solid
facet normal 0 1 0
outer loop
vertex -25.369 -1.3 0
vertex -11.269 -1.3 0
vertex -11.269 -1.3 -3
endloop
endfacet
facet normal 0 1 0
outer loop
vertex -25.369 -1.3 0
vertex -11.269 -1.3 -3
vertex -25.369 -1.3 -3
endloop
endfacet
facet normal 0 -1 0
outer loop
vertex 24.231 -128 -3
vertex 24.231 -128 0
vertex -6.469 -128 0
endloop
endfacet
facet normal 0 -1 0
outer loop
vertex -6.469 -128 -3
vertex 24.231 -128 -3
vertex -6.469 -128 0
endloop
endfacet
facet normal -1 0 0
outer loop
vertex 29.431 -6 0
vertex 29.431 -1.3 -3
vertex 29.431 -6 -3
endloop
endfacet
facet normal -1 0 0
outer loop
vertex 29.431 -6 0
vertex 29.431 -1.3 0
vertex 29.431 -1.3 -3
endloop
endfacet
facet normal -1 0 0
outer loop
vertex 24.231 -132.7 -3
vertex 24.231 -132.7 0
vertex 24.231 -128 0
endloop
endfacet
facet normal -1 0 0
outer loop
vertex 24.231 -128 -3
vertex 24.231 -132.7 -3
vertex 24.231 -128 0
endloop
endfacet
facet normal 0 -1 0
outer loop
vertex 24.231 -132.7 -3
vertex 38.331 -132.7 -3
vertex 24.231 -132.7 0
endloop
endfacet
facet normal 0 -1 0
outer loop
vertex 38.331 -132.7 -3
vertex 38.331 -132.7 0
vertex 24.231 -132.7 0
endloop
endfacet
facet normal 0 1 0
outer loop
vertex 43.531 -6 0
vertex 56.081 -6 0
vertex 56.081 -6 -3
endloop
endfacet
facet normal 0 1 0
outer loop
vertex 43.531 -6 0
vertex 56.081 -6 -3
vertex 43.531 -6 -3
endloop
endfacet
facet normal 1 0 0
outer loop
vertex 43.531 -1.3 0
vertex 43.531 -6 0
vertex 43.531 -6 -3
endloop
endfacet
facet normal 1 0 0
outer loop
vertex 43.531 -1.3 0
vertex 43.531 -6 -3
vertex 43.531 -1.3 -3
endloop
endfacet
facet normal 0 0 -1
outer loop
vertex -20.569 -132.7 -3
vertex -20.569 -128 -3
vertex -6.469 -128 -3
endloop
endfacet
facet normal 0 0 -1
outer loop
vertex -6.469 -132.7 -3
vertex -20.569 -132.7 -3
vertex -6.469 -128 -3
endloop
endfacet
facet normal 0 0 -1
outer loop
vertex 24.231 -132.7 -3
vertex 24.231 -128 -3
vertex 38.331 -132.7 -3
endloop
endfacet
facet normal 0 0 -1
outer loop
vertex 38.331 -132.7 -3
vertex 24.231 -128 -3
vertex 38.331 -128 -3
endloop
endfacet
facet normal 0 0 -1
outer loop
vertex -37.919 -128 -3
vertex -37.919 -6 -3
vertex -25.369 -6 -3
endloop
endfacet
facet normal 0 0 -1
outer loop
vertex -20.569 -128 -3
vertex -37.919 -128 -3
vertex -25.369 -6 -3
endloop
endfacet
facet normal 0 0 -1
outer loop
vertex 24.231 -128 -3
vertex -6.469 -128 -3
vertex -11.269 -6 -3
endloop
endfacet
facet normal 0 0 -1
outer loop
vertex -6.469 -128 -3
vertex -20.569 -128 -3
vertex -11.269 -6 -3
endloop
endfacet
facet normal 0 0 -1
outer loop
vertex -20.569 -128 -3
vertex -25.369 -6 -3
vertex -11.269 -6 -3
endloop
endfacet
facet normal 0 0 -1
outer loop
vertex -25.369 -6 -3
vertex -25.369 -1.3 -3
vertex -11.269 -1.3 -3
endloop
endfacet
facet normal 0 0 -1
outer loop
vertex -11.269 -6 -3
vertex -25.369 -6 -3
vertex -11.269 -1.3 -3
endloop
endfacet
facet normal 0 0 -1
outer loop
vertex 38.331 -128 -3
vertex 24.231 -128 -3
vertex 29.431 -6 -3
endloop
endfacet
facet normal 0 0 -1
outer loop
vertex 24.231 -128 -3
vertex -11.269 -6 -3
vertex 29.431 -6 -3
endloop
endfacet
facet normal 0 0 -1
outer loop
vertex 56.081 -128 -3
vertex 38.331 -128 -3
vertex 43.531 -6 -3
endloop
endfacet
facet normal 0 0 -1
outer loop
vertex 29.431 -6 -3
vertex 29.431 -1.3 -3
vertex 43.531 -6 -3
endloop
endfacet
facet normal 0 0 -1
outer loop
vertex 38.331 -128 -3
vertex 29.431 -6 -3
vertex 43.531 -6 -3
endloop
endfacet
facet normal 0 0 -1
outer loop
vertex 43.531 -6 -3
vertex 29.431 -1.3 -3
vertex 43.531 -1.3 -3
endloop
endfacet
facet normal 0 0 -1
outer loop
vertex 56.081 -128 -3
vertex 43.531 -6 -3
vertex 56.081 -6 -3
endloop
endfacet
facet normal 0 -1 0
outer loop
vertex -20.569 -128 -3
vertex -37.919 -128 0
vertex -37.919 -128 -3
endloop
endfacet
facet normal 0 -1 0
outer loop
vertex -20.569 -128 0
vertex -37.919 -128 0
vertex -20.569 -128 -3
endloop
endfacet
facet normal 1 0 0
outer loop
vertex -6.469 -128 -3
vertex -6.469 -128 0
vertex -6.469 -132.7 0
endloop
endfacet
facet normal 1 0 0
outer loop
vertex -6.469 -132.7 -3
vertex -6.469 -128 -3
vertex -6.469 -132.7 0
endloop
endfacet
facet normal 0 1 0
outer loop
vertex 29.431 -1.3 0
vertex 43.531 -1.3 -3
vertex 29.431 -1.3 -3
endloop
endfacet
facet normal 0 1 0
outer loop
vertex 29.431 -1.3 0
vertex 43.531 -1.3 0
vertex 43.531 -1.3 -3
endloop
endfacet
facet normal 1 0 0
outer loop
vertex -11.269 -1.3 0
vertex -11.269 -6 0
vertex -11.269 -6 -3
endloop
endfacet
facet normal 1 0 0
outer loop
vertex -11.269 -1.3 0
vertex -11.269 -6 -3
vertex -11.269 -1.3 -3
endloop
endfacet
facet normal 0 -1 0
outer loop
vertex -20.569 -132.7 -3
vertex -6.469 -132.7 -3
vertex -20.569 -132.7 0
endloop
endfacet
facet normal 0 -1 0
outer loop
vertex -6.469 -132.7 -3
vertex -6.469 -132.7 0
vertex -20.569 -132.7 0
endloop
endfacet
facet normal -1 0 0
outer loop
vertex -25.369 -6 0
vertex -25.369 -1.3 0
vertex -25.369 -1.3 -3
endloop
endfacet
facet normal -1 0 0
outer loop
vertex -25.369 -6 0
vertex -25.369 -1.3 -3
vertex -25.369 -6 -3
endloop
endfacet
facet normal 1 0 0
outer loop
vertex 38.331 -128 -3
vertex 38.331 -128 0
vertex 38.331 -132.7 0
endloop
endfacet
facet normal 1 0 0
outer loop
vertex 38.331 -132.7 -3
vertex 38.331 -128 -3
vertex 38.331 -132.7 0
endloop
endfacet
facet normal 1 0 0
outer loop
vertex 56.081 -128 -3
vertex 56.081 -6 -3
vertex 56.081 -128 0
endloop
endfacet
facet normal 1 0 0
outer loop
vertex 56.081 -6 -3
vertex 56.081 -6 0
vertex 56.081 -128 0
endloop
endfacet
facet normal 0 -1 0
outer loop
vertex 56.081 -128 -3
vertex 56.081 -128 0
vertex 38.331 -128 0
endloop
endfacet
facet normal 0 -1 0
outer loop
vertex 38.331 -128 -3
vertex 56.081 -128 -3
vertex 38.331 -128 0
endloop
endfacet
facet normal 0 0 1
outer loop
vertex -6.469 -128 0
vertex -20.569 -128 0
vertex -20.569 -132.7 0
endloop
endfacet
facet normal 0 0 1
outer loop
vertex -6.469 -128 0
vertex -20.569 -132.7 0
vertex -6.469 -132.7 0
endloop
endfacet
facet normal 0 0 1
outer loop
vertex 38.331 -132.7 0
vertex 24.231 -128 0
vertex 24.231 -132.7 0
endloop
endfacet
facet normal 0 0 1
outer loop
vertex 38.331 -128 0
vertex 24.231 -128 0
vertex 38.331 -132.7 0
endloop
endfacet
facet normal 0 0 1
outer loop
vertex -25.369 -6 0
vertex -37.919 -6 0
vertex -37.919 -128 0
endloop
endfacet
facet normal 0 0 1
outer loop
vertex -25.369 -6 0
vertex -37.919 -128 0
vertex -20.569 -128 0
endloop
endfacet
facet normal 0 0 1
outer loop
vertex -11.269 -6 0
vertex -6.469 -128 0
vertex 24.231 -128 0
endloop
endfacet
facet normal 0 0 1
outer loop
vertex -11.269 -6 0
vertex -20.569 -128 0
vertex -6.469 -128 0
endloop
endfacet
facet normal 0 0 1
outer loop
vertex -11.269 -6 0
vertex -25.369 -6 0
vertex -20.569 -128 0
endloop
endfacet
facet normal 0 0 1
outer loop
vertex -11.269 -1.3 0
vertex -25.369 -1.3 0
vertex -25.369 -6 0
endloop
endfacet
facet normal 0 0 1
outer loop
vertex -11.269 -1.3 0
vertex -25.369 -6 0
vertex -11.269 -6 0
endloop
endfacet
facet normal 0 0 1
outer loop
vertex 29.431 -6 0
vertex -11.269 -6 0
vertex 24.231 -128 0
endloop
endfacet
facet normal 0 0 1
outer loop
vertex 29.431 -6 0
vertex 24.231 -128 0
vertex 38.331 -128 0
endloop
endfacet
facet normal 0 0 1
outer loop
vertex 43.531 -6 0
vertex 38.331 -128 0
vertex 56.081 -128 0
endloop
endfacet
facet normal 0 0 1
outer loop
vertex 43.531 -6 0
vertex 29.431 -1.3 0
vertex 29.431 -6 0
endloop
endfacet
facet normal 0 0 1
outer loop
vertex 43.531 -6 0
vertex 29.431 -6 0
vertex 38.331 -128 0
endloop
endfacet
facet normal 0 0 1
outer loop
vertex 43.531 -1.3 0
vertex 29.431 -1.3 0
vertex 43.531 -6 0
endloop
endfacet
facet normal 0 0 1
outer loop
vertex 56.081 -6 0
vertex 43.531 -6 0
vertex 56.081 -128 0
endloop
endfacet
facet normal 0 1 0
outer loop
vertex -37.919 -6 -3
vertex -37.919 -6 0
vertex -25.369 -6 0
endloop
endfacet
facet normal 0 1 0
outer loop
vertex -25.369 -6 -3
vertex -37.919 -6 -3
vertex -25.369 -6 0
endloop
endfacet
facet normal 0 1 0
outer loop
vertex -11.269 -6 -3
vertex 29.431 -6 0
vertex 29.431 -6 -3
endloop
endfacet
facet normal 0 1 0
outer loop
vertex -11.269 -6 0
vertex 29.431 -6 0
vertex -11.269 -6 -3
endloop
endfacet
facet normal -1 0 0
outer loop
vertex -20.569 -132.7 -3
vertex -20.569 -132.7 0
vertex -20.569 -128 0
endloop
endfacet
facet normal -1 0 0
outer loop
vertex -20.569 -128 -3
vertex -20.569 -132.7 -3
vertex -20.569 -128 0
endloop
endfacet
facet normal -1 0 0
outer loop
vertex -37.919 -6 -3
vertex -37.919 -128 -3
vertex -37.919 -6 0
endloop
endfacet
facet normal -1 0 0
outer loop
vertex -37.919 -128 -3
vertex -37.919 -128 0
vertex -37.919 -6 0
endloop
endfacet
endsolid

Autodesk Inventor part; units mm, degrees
ref_plane "YZ Plane" through (0, 0, 0) normal (1, 0, 0) x (0, 1, 0)
ref_plane "XZ Plane" through (0, 0, 0) normal (0, 1, 0) x (-1, 0, 0)
ref_plane "XY Plane" through (0, 0, 0) normal (0, 0, 1) x (1, 0, 0)
sketch "NewProfile" plane through (0, 0, 0) normal (0, 0, 1) x (1, 0, 0)
  line L0 (28.6811, -6) -> (28.8811, -4) projected
  line L1 (44.2811, -6) -> (28.6811, -6) projected
  line L2 (44.0811, -4) -> (44.2811, -6) projected
  line L3 (28.8811, -4) -> (44.0811, -4) projected
  line L4 (-10.7189, -4) -> (-10.5189, -6) projected
  line L5 (-25.9189, -4) -> (-10.7189, -4) projected
  line L6 (-26.1189, -6) -> (-25.9189, -4) projected
  line L7 (-10.5189, -6) -> (-26.1189, -6) projected
  line L8 (44.2811, -128) -> (44.0811, -130) projected
  line L9 (28.6811, -128) -> (44.2811, -128) projected
  line L10 (28.8811, -130) -> (28.6811, -128) projected
  line L11 (44.0811, -130) -> (28.8811, -130) projected
  line L12 (-26.1189, -128) -> (-25.9189, -130) projected
  line L13 (-10.7189, -130) -> (-25.9189, -130) projected
  line L14 (-10.5189, -128) -> (-10.7189, -130) projected
  line L15 (-26.1189, -128) -> (-10.5189, -128) projected
  line L16 (-37.9189, -6) -> (56.0811, -6)
  line L17 (56.0811, -6) -> (56.0811, -128)
  line L18 (56.0811, -128) -> (-37.9189, -128)
  line L19 (-37.9189, -128) -> (-37.9189, -6)
  line L20 (-25.3689, -6) -> (-11.2689, -6)
  line L21 (-11.2689, -6) -> (-11.2689, -1.3)
  line L22 (-11.2689, -1.3) -> (-25.3689, -1.3)
  line L23 (-25.3689, -1.3) -> (-25.3689, -6)
  line L24 (29.4311, -6) -> (43.5311, -6)
  line L25 (43.5311, -6) -> (43.5311, -1.3)
  line L26 (43.5311, -1.3) -> (29.4311, -1.3)
  line L27 (29.4311, -1.3) -> (29.4311, -6)
  line L28 (-26.1189, -128) -> (-26.1189, -6) construction
  line L29 (-21.1189, -128) -> (-20.9189, -130) construction
  line L30 (-5.7189, -130) -> (-20.9189, -130) construction
  line L31 (-5.7189, -130) -> (-5.5189, -128) construction
  line L32 (-21.1189, -128) -> (-5.5189, -128) construction
  line L33 (39.0811, -130) -> (39.2811, -128) construction
  line L34 (23.6811, -128) -> (39.2811, -128) construction
  line L35 (23.8811, -130) -> (23.6811, -128) construction
  line L36 (39.0811, -130) -> (23.8811, -130) construction
  line L37 (-21.1189, -128) -> (-21.1189, -6) construction
  line L38 (-21.1189, -128) -> (100.8811, -128) construction
  line L39 (-10.5189, -128) -> (-10.5189, -6) construction
  line L40 (-10.5189, -128) -> (111.4811, -128) construction
  line L41 (-5.5189, -128) -> (-5.5189, -6) construction
  line L42 (-5.5189, -128) -> (116.4811, -128) construction
  line L43 (23.6811, -128) -> (23.6811, -6) construction
  line L44 (28.6811, -128) -> (28.6811, -6) construction
  line L45 (39.2811, -128) -> (39.2811, -6) construction
  line L46 (44.2811, -128) -> (44.2811, -6) construction
  line L47 (-5.5189, -6) -> (-5.7189, -4) construction
  line L48 (-20.9189, -4) -> (-5.7189, -4) construction
  line L49 (-20.9189, -4) -> (-21.1189, -6) construction
  line L50 (-5.5189, -6) -> (-21.1189, -6) construction
  line L51 (39.2811, -6) -> (39.0811, -4) construction
  line L52 (23.8811, -4) -> (39.0811, -4) construction
  line L53 (23.8811, -4) -> (23.6811, -6) construction
  line L54 (39.2811, -6) -> (23.6811, -6) construction
  line L55 (-20.5689, -128) -> (-6.4689, -128)
  line L56 (-6.4689, -128) -> (-6.4689, -132.7)
  line L57 (-6.4689, -132.7) -> (-20.5689, -132.7)
  line L58 (-20.5689, -132.7) -> (-20.5689, -128)
  line L59 (24.2311, -128) -> (38.3311, -128)
  line L60 (38.3311, -128) -> (38.3311, -132.7)
  line L61 (38.3311, -132.7) -> (24.2311, -132.7)
  line L62 (24.2311, -132.7) -> (24.2311, -128)
  point P0 (0, 0)
  dimension "d0" = 94
  dimension "d1" = 122
  dimension "d2" = 11.8
  dimension "d3" = 11.8
  dimension "d4" = 14.1
  dimension "d5" = 4.7
  dimension "d6" = 14.1
  dimension "d7" = 4.7
  dimension "d21" = 0.55
  dimension "d23" = 15.2
  dimension "d24" = 15.2
  dimension "d25" = 0.55
  dimension "d26" = 14.1
  dimension "d27" = 4.7
  dimension "d28" = 14.1
  dimension "d29" = 4.7
  dimension "d30" = 15.2
  dimension "d31" = 0.55
  dimension "d32" = 0.55
  dimension "d33" = 15.2
extrude "Extrusion1" add sketch "NewProfile" against normal blind 3 contours L1 L16 L17 L18 L9 L15 L19 L7 | L27 L3 L25 L1 | L27 L26 L25 L3 | L7 L23 L5 L21 | L5 L23 L22 L21 | L60 L11 L10 L9 | L60 L61 L62 L18 L10 L11 | L15 L14 L13 L58 | L13 L14 L18 L56 L57 L58
equation "\"d21\" = -0.5 * d4 + 0.5 * d23"
equation "\"d25\" = -0.5 * d6 + 0.5 * d24"
equation "\"d31\" = -0.5 * d26 + 0.5 * d30"
equation "\"d32\" = -0.5 * d28 + 0.5 * d33"
properties part number "SideWall_new"
